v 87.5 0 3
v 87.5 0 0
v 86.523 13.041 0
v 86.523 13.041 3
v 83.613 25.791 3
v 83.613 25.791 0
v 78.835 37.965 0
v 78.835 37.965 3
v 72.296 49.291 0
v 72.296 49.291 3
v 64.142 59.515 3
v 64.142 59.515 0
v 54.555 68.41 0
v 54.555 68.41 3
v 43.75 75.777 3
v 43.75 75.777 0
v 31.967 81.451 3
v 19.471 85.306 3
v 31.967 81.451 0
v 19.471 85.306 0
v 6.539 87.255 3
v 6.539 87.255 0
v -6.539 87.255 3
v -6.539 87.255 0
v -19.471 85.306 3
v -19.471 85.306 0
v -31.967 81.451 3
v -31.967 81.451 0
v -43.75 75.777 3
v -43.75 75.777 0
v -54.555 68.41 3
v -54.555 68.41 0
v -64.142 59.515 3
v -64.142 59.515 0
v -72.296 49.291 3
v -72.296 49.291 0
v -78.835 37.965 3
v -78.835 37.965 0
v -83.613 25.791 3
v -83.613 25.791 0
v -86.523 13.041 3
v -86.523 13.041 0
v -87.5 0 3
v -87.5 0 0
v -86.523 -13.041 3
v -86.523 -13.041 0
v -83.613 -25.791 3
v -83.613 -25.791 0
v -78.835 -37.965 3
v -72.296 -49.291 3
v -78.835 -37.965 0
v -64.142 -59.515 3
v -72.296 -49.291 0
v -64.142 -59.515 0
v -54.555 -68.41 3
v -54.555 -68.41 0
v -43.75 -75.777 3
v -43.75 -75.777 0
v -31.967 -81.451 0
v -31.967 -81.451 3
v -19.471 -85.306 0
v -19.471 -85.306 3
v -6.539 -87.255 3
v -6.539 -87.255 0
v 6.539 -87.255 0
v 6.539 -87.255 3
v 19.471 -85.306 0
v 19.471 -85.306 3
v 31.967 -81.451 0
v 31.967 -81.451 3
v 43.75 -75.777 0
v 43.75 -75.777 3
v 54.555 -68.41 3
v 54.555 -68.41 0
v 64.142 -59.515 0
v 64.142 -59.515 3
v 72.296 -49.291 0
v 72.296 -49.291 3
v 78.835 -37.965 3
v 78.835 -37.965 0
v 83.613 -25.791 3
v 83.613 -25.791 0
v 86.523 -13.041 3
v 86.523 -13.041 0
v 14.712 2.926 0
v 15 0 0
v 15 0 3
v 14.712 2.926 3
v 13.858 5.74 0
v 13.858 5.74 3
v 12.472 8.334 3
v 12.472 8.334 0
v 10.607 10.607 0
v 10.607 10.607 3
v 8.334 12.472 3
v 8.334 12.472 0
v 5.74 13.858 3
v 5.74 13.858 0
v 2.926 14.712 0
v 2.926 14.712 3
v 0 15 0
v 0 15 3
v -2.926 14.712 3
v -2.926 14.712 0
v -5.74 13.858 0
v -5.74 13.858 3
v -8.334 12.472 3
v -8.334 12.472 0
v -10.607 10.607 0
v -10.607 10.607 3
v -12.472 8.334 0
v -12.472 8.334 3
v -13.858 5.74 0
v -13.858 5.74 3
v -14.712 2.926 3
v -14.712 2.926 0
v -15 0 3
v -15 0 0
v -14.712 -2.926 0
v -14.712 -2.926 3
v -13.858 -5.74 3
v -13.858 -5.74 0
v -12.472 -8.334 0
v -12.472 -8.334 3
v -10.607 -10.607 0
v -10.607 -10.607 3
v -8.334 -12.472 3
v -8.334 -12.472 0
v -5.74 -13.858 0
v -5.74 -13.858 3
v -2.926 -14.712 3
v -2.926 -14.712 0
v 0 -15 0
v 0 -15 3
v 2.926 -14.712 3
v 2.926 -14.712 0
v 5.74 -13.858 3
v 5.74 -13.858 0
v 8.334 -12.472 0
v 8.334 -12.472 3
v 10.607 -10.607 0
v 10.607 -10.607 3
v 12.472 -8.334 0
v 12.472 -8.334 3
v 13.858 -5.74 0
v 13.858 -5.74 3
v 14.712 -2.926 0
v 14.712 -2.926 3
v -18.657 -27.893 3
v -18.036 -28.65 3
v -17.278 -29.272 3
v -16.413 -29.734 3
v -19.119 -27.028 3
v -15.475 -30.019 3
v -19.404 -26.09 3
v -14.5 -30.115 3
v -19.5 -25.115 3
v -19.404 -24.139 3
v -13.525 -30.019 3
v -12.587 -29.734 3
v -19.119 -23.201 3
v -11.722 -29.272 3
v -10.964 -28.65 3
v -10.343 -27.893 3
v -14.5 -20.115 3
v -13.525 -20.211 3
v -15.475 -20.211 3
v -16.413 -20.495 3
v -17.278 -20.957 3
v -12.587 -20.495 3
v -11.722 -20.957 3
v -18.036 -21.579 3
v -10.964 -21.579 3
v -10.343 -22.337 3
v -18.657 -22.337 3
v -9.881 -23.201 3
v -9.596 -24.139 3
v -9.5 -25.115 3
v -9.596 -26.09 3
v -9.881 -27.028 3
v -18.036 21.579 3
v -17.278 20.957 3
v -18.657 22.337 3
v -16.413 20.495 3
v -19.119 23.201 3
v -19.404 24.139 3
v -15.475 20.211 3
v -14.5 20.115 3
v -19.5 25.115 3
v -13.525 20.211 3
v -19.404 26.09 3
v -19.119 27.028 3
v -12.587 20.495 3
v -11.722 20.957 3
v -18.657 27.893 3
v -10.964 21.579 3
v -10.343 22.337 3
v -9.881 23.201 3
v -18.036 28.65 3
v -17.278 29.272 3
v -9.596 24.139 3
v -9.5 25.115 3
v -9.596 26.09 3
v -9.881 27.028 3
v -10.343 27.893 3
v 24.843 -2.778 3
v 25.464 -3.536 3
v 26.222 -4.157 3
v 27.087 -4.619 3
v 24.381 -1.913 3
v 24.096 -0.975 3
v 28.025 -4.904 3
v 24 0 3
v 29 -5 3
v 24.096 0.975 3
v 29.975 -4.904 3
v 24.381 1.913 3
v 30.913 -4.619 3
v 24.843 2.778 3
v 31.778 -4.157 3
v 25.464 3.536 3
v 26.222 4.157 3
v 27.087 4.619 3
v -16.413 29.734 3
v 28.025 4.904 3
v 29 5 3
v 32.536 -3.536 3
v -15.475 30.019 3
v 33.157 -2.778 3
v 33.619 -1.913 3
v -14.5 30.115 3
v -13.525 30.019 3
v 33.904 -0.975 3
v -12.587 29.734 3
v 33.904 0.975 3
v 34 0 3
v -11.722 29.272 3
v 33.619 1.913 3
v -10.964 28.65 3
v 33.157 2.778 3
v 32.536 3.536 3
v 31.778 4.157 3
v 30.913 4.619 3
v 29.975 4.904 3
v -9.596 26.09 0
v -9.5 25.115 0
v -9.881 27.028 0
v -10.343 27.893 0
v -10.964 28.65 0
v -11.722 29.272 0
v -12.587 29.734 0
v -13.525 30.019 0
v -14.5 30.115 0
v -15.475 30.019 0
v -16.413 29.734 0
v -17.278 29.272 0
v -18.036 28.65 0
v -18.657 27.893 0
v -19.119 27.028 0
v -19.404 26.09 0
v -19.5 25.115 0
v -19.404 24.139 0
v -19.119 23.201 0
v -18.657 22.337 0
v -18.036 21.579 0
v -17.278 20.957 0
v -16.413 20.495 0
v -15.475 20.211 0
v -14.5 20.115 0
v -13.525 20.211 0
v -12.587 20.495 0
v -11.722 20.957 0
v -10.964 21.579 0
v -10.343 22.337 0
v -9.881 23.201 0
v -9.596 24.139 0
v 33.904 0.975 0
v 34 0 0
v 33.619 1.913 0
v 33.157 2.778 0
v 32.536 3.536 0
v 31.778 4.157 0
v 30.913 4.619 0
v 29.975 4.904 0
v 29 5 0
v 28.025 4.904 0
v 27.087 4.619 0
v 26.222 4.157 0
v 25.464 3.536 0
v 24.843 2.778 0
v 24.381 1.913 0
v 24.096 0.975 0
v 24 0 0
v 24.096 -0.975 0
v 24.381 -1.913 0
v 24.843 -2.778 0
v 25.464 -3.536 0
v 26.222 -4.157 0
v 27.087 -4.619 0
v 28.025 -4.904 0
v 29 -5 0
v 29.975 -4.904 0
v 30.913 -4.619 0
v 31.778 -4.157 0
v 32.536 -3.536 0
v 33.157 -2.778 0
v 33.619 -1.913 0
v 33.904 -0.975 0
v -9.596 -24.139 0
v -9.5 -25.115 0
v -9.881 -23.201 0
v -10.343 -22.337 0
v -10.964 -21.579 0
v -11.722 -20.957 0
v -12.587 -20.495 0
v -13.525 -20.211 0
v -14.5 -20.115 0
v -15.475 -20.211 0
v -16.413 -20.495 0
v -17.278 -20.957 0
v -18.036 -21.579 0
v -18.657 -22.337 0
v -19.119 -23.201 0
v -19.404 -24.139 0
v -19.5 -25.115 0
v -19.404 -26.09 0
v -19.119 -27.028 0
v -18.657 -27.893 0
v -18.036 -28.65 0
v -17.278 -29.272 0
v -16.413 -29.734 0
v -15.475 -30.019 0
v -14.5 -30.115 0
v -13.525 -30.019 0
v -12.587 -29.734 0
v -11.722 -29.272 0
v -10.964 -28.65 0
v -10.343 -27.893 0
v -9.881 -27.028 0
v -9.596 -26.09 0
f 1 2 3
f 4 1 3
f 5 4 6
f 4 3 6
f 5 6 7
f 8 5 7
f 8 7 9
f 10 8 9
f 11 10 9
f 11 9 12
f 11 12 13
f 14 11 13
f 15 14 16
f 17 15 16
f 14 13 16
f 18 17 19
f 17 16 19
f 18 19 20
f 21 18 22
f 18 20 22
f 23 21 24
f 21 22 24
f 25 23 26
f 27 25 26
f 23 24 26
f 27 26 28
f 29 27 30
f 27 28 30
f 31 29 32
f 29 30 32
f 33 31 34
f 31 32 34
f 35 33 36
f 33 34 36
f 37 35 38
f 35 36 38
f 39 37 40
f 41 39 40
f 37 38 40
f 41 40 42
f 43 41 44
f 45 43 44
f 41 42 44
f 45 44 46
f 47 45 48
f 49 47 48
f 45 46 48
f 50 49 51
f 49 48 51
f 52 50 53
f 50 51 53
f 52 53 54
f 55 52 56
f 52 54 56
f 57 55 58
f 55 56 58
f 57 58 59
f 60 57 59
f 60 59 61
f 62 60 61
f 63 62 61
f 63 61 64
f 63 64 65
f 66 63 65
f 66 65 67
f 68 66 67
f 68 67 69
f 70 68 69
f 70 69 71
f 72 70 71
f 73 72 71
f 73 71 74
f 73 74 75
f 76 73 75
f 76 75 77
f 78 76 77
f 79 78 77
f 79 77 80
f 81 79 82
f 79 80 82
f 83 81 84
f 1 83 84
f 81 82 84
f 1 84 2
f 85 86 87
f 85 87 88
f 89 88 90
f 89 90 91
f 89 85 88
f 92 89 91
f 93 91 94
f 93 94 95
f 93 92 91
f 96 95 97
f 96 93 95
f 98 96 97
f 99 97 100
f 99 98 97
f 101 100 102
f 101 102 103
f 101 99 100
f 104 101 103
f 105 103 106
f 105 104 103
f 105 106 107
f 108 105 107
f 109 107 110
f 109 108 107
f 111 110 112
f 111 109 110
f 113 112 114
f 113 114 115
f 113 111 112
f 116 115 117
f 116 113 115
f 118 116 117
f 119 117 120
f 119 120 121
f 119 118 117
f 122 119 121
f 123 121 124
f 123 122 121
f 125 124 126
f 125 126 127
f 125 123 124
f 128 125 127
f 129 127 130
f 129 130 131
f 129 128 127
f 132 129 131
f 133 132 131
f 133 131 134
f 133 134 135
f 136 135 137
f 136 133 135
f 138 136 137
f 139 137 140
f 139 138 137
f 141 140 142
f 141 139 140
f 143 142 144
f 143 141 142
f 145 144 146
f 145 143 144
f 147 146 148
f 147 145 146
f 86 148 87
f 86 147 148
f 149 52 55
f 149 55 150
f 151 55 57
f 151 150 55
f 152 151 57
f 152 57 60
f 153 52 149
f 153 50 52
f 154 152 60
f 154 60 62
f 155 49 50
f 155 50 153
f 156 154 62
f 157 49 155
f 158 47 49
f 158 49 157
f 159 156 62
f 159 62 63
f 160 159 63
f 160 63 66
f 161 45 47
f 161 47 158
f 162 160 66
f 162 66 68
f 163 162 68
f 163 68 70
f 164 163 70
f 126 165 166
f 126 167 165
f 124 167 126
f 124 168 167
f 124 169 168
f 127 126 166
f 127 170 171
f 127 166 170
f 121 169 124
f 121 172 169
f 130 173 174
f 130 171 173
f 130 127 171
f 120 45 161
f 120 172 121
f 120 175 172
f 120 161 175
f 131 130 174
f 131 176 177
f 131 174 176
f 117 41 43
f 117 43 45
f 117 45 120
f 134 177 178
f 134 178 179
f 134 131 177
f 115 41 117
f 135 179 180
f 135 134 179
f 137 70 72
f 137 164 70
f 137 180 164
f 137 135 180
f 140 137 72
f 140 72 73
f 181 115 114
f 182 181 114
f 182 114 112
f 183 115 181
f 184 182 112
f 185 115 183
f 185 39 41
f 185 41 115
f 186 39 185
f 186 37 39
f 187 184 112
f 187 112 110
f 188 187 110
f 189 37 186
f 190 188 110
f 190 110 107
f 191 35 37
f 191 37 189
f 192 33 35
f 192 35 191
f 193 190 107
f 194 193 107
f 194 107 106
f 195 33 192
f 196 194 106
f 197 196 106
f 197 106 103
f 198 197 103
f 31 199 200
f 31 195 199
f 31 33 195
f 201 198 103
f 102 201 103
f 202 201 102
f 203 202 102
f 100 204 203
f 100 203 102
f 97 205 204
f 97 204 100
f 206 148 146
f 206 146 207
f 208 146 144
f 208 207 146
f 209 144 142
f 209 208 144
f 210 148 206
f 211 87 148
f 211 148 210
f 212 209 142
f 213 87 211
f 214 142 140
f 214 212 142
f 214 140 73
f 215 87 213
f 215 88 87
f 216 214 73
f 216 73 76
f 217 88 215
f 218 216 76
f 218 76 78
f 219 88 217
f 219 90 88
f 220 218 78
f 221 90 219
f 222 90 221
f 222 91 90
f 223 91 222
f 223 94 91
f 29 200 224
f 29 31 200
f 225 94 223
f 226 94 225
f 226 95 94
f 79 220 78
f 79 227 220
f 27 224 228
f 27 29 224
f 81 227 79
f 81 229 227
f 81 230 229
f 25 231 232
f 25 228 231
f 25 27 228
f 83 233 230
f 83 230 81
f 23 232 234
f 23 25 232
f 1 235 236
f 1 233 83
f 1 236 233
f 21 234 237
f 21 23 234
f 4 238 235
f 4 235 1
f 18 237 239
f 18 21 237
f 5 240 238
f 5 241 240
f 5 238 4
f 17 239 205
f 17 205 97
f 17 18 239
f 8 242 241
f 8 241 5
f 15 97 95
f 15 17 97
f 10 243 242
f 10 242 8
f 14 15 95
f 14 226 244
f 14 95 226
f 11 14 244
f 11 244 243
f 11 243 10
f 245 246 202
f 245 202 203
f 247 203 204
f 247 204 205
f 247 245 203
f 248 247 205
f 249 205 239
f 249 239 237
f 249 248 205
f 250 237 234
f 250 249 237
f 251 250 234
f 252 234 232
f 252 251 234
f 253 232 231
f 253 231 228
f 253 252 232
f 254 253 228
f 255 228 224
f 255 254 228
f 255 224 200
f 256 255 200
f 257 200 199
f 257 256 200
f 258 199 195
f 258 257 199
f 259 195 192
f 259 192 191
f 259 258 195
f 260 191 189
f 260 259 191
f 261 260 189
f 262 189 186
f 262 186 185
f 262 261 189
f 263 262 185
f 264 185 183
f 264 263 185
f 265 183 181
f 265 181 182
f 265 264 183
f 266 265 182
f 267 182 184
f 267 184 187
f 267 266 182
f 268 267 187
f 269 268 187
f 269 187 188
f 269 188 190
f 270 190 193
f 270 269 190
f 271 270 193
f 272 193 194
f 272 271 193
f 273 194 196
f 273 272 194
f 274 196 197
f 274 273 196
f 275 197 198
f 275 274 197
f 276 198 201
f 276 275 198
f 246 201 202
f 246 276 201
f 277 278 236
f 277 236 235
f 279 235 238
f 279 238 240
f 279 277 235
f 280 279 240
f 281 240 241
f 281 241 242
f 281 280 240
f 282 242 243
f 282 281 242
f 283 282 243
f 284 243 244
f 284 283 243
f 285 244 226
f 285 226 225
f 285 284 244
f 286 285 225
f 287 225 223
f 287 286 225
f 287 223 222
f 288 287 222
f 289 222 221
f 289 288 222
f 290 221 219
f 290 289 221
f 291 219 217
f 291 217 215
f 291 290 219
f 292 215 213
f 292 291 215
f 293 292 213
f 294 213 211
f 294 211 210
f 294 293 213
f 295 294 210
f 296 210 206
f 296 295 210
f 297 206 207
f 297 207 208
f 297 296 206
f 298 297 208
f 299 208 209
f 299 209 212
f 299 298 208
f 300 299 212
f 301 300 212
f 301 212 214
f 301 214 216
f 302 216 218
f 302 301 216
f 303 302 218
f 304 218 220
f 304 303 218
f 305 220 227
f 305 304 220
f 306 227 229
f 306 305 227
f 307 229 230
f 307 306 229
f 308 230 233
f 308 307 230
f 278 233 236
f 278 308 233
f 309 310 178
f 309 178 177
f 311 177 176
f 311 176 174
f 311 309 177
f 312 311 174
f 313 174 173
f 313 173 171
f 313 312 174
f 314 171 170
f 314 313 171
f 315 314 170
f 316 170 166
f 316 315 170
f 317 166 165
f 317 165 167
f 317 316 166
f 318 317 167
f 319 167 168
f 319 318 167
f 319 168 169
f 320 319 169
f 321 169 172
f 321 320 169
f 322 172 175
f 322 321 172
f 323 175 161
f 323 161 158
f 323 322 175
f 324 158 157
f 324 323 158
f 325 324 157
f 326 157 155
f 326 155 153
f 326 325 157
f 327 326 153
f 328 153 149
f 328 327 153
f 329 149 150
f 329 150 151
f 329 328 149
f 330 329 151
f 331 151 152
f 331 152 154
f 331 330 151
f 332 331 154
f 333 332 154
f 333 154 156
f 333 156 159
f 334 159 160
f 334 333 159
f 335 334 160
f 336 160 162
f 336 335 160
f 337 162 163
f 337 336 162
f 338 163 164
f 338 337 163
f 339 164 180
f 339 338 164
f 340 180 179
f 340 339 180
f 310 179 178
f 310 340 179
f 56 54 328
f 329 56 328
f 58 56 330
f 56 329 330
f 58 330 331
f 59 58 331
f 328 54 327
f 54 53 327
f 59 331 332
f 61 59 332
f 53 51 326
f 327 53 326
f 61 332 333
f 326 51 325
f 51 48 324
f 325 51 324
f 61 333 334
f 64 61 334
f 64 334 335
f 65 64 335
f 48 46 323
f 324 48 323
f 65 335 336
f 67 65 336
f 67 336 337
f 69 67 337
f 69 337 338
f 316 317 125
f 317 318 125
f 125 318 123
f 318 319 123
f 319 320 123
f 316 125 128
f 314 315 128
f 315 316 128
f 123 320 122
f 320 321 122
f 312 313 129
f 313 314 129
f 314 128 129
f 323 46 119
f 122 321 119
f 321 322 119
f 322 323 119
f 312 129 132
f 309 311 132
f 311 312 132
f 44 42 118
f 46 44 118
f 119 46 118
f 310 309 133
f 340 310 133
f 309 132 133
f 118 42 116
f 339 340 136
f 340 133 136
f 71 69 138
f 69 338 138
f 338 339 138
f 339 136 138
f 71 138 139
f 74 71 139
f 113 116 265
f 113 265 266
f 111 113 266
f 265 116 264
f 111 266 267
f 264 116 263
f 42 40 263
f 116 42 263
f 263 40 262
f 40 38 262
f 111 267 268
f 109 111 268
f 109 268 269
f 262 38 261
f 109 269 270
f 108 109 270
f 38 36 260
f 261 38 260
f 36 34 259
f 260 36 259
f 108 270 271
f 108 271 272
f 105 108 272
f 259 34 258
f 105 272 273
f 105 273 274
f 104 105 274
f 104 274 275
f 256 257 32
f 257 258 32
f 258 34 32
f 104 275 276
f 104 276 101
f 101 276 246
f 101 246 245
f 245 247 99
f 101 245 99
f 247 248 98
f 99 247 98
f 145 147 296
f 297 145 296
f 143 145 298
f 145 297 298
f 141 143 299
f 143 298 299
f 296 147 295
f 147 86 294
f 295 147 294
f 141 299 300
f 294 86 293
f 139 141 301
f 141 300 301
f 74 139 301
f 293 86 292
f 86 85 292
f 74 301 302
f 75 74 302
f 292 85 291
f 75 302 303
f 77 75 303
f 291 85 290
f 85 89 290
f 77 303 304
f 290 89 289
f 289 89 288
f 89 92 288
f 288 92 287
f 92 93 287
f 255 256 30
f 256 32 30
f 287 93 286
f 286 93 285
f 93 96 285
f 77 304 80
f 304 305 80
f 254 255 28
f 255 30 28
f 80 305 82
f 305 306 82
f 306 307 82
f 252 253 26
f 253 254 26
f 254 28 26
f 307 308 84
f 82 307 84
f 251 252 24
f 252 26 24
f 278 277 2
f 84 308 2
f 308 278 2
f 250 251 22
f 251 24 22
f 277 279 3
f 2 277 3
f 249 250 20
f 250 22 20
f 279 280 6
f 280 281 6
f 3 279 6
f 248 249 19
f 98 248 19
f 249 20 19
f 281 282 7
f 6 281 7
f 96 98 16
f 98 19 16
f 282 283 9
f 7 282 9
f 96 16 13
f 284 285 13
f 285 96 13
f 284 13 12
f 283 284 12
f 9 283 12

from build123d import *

# Parameters (mm, degrees)
SKETCH1_R           = 87.5
SKETCH1_R_2         = 5
SKETCH1_R_3         = 15
BOSS_EXTRUDE1_DEPTH = 3


with BuildPart() as part:
    # Sketch1 → Boss-Extrude1 (new body)
    with BuildSketch(Plane.XY):
        Circle(SKETCH1_R)
        with Locations((29, 0)):
            Circle(SKETCH1_R_2, mode=Mode.SUBTRACT)
        with Locations((-14.5, -25.11473671)):
            Circle(SKETCH1_R_2, mode=Mode.SUBTRACT)
        with Locations((-14.5, 25.11473671)):
            Circle(SKETCH1_R_2, mode=Mode.SUBTRACT)
        Circle(SKETCH1_R_3, mode=Mode.SUBTRACT)
    extrude(amount=BOSS_EXTRUDE1_DEPTH)


solid = part.part
